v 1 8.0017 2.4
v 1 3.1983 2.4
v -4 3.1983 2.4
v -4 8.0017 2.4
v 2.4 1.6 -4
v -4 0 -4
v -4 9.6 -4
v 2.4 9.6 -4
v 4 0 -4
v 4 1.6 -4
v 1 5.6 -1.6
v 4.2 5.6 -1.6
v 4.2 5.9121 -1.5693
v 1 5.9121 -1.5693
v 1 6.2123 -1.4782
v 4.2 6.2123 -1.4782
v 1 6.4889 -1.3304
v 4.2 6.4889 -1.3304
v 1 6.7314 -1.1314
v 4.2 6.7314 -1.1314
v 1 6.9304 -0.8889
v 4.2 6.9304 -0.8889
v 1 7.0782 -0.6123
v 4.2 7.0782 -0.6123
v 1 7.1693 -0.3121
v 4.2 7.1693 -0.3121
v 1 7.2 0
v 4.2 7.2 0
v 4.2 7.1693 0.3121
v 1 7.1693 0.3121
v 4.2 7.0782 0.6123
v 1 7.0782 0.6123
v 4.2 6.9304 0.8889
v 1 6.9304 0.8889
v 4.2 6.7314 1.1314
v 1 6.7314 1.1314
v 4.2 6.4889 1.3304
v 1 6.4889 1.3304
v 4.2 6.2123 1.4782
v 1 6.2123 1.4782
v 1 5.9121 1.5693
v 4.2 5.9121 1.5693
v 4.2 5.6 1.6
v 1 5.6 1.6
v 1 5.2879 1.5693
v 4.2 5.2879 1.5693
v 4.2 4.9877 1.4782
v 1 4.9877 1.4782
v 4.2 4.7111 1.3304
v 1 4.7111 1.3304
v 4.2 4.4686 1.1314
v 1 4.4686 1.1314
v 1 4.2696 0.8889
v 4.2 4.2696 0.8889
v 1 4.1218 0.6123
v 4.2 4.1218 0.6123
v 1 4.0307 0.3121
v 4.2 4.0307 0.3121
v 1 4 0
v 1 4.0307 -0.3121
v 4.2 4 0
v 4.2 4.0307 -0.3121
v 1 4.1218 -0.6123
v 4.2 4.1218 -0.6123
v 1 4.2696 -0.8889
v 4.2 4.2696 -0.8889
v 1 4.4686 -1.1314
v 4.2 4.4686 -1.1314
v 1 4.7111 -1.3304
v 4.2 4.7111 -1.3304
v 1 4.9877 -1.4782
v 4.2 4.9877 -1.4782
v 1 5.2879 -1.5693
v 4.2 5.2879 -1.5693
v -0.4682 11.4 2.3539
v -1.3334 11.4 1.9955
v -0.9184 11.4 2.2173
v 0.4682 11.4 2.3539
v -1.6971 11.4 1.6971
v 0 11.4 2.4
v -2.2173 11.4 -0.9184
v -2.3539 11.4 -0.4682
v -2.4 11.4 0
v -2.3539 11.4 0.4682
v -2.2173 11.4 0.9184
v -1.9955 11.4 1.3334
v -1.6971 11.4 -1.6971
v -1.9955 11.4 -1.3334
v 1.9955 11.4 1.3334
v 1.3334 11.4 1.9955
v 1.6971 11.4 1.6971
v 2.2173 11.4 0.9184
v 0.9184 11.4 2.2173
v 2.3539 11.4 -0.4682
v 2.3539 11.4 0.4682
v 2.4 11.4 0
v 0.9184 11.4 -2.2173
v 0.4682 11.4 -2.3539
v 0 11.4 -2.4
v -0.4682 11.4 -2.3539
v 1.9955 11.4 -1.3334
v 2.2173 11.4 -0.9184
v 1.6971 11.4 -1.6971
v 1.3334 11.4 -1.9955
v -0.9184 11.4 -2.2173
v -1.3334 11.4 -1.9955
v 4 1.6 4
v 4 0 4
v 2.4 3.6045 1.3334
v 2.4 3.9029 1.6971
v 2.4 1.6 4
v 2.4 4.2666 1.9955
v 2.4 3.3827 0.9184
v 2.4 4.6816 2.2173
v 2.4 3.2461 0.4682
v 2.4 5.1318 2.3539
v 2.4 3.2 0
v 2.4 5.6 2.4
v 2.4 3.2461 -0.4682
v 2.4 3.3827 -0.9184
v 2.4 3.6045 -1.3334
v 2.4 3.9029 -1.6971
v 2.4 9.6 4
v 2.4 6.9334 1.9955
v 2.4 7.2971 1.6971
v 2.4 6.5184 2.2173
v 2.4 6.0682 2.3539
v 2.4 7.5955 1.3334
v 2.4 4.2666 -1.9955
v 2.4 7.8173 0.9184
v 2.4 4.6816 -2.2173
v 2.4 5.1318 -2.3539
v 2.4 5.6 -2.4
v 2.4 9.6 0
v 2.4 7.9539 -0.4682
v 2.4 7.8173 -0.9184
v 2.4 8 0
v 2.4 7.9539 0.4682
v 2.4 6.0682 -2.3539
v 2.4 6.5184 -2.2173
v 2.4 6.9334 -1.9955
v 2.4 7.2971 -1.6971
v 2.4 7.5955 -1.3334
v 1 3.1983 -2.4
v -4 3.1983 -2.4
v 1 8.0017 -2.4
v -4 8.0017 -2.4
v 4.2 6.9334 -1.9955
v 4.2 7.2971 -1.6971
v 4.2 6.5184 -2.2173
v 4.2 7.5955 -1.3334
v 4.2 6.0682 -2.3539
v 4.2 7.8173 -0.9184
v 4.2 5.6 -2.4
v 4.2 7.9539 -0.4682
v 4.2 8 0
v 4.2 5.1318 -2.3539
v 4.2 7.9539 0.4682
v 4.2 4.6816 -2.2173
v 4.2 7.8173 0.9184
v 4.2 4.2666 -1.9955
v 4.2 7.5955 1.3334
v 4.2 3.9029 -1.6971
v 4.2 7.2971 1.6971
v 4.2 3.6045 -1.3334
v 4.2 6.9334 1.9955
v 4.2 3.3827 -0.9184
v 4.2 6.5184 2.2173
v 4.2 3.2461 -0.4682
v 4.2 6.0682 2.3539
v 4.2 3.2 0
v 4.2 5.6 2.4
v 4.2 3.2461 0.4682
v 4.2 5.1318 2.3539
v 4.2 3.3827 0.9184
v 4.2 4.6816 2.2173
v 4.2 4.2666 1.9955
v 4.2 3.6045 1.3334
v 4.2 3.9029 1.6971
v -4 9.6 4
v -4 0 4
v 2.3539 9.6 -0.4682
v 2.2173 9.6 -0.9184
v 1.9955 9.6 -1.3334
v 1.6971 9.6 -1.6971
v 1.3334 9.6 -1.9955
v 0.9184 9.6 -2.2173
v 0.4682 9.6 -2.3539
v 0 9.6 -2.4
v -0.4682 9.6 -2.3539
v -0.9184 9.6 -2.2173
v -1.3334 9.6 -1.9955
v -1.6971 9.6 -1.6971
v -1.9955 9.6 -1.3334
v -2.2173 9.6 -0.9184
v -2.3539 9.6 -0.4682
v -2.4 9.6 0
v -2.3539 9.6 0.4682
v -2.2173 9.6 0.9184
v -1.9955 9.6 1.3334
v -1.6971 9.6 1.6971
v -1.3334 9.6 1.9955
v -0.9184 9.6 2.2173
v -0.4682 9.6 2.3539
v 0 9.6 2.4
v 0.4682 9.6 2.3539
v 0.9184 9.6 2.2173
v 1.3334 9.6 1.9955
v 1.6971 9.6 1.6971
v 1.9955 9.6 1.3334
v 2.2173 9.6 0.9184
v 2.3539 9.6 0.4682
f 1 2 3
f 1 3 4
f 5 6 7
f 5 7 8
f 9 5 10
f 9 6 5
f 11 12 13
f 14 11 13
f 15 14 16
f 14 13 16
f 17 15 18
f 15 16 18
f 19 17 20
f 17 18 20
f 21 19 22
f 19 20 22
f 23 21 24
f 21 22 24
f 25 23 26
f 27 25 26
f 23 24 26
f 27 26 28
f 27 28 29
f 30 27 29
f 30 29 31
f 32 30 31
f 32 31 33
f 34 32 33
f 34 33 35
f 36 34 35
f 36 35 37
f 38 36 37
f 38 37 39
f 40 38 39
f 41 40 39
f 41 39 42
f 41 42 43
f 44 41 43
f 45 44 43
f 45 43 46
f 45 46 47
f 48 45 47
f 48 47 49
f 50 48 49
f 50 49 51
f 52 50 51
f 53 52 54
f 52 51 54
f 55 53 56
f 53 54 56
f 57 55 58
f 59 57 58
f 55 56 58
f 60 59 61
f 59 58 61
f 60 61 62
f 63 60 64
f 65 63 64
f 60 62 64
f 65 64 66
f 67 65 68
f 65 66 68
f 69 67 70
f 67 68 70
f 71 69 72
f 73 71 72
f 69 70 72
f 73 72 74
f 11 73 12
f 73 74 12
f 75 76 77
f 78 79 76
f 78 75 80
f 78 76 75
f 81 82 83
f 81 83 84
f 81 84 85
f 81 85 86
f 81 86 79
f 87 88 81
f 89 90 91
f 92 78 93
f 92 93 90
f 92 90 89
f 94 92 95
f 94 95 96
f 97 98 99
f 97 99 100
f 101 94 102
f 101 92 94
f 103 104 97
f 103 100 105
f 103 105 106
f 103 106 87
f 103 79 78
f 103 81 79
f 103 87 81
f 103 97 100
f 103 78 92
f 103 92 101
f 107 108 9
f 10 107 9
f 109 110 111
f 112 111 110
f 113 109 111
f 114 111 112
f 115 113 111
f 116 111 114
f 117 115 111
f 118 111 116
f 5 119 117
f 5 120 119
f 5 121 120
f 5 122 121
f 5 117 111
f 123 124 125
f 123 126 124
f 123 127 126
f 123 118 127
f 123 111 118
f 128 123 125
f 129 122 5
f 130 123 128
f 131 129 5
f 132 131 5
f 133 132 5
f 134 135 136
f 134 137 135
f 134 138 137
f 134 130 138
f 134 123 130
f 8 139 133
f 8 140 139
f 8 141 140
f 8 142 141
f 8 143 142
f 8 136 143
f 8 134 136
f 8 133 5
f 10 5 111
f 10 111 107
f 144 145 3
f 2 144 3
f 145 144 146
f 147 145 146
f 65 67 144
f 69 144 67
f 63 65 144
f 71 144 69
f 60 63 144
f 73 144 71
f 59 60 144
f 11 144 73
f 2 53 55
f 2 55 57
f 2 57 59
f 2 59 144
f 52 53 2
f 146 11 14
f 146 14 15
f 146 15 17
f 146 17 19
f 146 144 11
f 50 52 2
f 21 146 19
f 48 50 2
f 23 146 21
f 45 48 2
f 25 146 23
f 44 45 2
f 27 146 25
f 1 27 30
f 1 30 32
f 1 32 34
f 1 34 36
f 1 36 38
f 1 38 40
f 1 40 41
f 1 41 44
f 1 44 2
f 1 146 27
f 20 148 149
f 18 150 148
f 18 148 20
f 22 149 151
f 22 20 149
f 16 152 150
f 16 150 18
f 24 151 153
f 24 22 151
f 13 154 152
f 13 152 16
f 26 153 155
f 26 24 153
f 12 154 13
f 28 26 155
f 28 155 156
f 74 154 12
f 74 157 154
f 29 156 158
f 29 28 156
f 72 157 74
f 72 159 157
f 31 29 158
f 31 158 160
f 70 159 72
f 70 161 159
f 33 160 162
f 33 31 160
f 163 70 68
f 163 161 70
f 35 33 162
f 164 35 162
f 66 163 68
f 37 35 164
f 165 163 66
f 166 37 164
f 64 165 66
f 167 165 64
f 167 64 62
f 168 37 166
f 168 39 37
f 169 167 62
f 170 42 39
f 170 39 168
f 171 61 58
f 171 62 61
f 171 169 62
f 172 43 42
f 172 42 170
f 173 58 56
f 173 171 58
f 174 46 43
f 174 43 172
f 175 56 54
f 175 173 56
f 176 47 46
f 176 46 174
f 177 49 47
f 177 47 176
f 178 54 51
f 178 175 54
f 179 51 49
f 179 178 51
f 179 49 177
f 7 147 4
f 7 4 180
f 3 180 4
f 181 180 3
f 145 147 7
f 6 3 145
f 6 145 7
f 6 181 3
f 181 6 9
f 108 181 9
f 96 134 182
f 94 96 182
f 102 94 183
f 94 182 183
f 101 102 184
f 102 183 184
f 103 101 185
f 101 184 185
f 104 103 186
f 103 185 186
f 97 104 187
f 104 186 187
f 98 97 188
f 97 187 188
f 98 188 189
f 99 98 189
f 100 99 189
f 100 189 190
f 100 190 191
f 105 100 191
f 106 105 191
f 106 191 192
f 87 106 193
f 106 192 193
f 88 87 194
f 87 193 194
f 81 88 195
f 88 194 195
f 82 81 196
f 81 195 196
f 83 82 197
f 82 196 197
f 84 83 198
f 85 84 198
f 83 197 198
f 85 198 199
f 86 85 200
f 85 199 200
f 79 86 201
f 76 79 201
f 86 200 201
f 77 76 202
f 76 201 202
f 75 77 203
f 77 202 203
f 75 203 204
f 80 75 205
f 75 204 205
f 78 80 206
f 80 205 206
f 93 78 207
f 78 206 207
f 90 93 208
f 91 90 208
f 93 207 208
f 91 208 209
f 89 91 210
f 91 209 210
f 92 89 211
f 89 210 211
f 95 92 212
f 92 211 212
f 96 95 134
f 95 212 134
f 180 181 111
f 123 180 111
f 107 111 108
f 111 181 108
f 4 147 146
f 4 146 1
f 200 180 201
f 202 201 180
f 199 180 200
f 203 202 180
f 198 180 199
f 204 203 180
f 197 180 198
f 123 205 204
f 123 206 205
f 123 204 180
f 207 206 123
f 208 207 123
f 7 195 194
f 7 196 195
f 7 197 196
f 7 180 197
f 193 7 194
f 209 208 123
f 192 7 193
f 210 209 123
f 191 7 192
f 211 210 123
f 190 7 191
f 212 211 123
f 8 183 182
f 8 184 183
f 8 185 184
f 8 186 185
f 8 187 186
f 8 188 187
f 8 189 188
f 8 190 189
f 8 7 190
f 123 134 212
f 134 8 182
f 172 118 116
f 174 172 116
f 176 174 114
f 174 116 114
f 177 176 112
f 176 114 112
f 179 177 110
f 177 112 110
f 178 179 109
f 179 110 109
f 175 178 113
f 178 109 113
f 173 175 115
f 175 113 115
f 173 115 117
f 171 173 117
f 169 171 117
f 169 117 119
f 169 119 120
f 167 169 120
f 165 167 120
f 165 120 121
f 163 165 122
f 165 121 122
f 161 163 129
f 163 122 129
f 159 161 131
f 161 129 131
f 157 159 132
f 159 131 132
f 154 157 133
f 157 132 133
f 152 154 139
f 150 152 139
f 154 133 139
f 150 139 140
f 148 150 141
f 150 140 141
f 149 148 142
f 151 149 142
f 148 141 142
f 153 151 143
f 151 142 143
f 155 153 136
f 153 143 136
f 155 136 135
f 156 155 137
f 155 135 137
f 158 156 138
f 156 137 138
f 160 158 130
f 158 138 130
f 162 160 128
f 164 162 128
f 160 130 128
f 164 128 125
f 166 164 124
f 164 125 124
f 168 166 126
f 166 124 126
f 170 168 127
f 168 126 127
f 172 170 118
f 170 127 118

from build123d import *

# Parameters (mm, degrees)
SKETCH_1_W          = 8
SKETCH_1_H          = 8
EXTRUDE_1_DEPTH     = 9.6
SKETCH_2_W          = 1.6
SKETCH_2_H          = 8
CUT_EXTRUDE_1_DEPTH = 8
SKETCH_5_R          = 2.4
EXTRUDE_2_DEPTH     = 1.8
SKETCH_8_R          = 1.6
CUT_EXTRUDE_3_DEPTH = 9
SKETCH_9_R          = 2.4
EXTRUDE_3_DEPTH     = 1.8
SKETCH_13_W         = 4.8
SKETCH_13_H         = 4.803439306
CUT_EXTRUDE_4_DEPTH = 5


with BuildPart() as part:
    # Эскиз1 → Бобышка-Вытянуть1 (new body)
    with BuildSketch(Plane(origin=(0, 0, 0), x_dir=(1, 0, 0), z_dir=(0, 1, 0))):
        Rectangle(SKETCH_1_W, SKETCH_1_H)
    extrude(amount=EXTRUDE_1_DEPTH)

    # Эскиз2 → Вырез-Вытянуть1 (cut)
    with BuildSketch(Plane(origin=(0, 9.6, 0), x_dir=(1, 0, 0), z_dir=(0, 1, 0))):
        with Locations((3.2, 0)):
            Rectangle(SKETCH_2_W, SKETCH_2_H)
    extrude(amount=-CUT_EXTRUDE_1_DEPTH, mode=Mode.SUBTRACT)

    # Эскиз5 → Бобышка-Вытянуть2 (add)
    with BuildSketch(Plane(origin=(2.4, 0, 0), x_dir=(0, 0, -1), z_dir=(1, 0, 0))):
        with Locations(Location((0, 5.6, 0), (0, 0, 180))):
            Circle(SKETCH_5_R)
    extrude(amount=EXTRUDE_2_DEPTH)

    # Эскиз8 → Вырез-Вытянуть3 (cut)
    with BuildSketch(Plane(origin=(4.2, 0, 0), x_dir=(0, 0, -1), z_dir=(1, 0, 0))):
        with Locations((0, 5.6)):
            Circle(SKETCH_8_R)
    extrude(amount=-CUT_EXTRUDE_3_DEPTH, mode=Mode.SUBTRACT)

    # Эскиз9 → Бобышка-Вытянуть3 (add)
    with BuildSketch(Plane(origin=(0, 9.6, 0), x_dir=(1, 0, 0), z_dir=(0, 1, 0))):
        Circle(SKETCH_9_R)
    extrude(amount=EXTRUDE_3_DEPTH)

    # Эскиз13 → Вырез-Вытянуть4 (cut)
    with BuildSketch(Plane.ZY.offset(4)):
        with Locations((0, 5.6)):
            Rectangle(SKETCH_13_W, SKETCH_13_H)
    extrude(amount=-CUT_EXTRUDE_4_DEPTH, mode=Mode.SUBTRACT)


solid = part.part
